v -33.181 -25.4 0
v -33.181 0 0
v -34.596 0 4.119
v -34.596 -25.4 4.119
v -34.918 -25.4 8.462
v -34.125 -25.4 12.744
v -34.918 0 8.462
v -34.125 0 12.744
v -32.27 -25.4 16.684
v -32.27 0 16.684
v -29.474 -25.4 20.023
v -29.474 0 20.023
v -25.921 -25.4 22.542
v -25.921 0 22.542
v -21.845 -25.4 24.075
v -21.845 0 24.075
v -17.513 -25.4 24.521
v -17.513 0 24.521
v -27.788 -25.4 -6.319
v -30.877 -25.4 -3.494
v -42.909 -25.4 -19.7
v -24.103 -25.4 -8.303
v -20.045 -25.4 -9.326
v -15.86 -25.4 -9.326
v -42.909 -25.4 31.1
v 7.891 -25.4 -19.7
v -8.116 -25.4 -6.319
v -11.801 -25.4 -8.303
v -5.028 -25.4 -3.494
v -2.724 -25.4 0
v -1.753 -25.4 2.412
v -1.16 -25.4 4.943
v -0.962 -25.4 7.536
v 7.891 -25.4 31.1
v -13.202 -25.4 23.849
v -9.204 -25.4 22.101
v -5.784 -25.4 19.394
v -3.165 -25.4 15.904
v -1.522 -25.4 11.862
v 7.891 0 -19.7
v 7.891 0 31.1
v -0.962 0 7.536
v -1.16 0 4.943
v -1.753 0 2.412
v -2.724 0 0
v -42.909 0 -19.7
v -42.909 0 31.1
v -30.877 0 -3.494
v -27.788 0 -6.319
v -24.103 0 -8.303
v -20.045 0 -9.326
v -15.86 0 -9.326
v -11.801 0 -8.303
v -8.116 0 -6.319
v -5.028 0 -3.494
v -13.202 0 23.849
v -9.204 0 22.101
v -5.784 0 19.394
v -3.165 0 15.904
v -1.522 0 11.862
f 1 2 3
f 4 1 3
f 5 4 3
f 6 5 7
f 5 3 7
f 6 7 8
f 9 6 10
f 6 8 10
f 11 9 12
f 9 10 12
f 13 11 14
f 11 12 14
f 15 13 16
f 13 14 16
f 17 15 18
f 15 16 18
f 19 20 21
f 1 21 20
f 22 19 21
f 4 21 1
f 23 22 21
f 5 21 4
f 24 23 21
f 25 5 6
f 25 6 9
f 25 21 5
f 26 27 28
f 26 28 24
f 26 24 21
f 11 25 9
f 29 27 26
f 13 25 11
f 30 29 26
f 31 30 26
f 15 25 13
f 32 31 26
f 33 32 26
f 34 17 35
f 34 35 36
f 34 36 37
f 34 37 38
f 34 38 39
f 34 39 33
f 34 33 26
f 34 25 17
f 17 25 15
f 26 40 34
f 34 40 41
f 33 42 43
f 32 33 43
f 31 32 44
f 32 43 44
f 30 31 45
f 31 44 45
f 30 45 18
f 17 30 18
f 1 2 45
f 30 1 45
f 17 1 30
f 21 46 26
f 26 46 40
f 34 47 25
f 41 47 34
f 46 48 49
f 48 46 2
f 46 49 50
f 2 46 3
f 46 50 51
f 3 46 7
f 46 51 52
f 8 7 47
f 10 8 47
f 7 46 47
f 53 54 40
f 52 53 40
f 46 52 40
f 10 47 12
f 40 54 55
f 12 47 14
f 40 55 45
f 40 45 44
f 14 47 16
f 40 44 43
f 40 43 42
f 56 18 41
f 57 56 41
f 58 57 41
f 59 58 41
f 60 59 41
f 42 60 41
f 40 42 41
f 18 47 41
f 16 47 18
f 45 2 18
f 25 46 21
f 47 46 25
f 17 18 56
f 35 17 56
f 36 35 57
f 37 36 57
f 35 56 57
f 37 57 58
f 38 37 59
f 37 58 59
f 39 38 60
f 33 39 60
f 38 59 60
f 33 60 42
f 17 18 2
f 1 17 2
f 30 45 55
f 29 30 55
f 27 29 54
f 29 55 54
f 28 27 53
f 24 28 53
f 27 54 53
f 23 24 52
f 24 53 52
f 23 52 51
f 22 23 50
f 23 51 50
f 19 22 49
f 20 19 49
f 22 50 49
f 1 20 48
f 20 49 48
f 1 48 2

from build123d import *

# Parameters (mm, degrees)
F0_W     = 50.8
F0_H     = 50.8
F1_DEPTH = 25.4
F2_DEPTH = 25.4


with BuildPart() as f1:
    # F0 (on Front) → F1 (new body)
    with BuildSketch(Plane.XZ):
        with Locations((-17.509114, 5.700153)):
            Rectangle(F0_W, F0_H)
        with BuildLine():
            ThreePointArc((-17.512876, 24.520725), (-5.783645, 19.393501), (-0.96154, 7.535568))
            ThreePointArc((-0.96154, 7.535568), (-1.408018, 3.666104), (-2.723989, 0))
            ThreePointArc((-2.723989, 0), (-17.952383, -9.455275), (-33.180776, 0))
            ThreePointArc((-33.180776, 0), (-32.270004, 16.684035), (-17.512876, 24.520725))
        make_face(mode=Mode.SUBTRACT)
    extrude(amount=F1_DEPTH)


with BuildPart() as f2:
    # F0 (on Front) → F2 (new body)
    with BuildSketch(Plane.XZ):
        Polygon((-2.723989, 0), (-17.512876, 24.520725), (-33.180776, 0), align=None)
    extrude(amount=F2_DEPTH)


solid = Compound([f1.part, f2.part])
